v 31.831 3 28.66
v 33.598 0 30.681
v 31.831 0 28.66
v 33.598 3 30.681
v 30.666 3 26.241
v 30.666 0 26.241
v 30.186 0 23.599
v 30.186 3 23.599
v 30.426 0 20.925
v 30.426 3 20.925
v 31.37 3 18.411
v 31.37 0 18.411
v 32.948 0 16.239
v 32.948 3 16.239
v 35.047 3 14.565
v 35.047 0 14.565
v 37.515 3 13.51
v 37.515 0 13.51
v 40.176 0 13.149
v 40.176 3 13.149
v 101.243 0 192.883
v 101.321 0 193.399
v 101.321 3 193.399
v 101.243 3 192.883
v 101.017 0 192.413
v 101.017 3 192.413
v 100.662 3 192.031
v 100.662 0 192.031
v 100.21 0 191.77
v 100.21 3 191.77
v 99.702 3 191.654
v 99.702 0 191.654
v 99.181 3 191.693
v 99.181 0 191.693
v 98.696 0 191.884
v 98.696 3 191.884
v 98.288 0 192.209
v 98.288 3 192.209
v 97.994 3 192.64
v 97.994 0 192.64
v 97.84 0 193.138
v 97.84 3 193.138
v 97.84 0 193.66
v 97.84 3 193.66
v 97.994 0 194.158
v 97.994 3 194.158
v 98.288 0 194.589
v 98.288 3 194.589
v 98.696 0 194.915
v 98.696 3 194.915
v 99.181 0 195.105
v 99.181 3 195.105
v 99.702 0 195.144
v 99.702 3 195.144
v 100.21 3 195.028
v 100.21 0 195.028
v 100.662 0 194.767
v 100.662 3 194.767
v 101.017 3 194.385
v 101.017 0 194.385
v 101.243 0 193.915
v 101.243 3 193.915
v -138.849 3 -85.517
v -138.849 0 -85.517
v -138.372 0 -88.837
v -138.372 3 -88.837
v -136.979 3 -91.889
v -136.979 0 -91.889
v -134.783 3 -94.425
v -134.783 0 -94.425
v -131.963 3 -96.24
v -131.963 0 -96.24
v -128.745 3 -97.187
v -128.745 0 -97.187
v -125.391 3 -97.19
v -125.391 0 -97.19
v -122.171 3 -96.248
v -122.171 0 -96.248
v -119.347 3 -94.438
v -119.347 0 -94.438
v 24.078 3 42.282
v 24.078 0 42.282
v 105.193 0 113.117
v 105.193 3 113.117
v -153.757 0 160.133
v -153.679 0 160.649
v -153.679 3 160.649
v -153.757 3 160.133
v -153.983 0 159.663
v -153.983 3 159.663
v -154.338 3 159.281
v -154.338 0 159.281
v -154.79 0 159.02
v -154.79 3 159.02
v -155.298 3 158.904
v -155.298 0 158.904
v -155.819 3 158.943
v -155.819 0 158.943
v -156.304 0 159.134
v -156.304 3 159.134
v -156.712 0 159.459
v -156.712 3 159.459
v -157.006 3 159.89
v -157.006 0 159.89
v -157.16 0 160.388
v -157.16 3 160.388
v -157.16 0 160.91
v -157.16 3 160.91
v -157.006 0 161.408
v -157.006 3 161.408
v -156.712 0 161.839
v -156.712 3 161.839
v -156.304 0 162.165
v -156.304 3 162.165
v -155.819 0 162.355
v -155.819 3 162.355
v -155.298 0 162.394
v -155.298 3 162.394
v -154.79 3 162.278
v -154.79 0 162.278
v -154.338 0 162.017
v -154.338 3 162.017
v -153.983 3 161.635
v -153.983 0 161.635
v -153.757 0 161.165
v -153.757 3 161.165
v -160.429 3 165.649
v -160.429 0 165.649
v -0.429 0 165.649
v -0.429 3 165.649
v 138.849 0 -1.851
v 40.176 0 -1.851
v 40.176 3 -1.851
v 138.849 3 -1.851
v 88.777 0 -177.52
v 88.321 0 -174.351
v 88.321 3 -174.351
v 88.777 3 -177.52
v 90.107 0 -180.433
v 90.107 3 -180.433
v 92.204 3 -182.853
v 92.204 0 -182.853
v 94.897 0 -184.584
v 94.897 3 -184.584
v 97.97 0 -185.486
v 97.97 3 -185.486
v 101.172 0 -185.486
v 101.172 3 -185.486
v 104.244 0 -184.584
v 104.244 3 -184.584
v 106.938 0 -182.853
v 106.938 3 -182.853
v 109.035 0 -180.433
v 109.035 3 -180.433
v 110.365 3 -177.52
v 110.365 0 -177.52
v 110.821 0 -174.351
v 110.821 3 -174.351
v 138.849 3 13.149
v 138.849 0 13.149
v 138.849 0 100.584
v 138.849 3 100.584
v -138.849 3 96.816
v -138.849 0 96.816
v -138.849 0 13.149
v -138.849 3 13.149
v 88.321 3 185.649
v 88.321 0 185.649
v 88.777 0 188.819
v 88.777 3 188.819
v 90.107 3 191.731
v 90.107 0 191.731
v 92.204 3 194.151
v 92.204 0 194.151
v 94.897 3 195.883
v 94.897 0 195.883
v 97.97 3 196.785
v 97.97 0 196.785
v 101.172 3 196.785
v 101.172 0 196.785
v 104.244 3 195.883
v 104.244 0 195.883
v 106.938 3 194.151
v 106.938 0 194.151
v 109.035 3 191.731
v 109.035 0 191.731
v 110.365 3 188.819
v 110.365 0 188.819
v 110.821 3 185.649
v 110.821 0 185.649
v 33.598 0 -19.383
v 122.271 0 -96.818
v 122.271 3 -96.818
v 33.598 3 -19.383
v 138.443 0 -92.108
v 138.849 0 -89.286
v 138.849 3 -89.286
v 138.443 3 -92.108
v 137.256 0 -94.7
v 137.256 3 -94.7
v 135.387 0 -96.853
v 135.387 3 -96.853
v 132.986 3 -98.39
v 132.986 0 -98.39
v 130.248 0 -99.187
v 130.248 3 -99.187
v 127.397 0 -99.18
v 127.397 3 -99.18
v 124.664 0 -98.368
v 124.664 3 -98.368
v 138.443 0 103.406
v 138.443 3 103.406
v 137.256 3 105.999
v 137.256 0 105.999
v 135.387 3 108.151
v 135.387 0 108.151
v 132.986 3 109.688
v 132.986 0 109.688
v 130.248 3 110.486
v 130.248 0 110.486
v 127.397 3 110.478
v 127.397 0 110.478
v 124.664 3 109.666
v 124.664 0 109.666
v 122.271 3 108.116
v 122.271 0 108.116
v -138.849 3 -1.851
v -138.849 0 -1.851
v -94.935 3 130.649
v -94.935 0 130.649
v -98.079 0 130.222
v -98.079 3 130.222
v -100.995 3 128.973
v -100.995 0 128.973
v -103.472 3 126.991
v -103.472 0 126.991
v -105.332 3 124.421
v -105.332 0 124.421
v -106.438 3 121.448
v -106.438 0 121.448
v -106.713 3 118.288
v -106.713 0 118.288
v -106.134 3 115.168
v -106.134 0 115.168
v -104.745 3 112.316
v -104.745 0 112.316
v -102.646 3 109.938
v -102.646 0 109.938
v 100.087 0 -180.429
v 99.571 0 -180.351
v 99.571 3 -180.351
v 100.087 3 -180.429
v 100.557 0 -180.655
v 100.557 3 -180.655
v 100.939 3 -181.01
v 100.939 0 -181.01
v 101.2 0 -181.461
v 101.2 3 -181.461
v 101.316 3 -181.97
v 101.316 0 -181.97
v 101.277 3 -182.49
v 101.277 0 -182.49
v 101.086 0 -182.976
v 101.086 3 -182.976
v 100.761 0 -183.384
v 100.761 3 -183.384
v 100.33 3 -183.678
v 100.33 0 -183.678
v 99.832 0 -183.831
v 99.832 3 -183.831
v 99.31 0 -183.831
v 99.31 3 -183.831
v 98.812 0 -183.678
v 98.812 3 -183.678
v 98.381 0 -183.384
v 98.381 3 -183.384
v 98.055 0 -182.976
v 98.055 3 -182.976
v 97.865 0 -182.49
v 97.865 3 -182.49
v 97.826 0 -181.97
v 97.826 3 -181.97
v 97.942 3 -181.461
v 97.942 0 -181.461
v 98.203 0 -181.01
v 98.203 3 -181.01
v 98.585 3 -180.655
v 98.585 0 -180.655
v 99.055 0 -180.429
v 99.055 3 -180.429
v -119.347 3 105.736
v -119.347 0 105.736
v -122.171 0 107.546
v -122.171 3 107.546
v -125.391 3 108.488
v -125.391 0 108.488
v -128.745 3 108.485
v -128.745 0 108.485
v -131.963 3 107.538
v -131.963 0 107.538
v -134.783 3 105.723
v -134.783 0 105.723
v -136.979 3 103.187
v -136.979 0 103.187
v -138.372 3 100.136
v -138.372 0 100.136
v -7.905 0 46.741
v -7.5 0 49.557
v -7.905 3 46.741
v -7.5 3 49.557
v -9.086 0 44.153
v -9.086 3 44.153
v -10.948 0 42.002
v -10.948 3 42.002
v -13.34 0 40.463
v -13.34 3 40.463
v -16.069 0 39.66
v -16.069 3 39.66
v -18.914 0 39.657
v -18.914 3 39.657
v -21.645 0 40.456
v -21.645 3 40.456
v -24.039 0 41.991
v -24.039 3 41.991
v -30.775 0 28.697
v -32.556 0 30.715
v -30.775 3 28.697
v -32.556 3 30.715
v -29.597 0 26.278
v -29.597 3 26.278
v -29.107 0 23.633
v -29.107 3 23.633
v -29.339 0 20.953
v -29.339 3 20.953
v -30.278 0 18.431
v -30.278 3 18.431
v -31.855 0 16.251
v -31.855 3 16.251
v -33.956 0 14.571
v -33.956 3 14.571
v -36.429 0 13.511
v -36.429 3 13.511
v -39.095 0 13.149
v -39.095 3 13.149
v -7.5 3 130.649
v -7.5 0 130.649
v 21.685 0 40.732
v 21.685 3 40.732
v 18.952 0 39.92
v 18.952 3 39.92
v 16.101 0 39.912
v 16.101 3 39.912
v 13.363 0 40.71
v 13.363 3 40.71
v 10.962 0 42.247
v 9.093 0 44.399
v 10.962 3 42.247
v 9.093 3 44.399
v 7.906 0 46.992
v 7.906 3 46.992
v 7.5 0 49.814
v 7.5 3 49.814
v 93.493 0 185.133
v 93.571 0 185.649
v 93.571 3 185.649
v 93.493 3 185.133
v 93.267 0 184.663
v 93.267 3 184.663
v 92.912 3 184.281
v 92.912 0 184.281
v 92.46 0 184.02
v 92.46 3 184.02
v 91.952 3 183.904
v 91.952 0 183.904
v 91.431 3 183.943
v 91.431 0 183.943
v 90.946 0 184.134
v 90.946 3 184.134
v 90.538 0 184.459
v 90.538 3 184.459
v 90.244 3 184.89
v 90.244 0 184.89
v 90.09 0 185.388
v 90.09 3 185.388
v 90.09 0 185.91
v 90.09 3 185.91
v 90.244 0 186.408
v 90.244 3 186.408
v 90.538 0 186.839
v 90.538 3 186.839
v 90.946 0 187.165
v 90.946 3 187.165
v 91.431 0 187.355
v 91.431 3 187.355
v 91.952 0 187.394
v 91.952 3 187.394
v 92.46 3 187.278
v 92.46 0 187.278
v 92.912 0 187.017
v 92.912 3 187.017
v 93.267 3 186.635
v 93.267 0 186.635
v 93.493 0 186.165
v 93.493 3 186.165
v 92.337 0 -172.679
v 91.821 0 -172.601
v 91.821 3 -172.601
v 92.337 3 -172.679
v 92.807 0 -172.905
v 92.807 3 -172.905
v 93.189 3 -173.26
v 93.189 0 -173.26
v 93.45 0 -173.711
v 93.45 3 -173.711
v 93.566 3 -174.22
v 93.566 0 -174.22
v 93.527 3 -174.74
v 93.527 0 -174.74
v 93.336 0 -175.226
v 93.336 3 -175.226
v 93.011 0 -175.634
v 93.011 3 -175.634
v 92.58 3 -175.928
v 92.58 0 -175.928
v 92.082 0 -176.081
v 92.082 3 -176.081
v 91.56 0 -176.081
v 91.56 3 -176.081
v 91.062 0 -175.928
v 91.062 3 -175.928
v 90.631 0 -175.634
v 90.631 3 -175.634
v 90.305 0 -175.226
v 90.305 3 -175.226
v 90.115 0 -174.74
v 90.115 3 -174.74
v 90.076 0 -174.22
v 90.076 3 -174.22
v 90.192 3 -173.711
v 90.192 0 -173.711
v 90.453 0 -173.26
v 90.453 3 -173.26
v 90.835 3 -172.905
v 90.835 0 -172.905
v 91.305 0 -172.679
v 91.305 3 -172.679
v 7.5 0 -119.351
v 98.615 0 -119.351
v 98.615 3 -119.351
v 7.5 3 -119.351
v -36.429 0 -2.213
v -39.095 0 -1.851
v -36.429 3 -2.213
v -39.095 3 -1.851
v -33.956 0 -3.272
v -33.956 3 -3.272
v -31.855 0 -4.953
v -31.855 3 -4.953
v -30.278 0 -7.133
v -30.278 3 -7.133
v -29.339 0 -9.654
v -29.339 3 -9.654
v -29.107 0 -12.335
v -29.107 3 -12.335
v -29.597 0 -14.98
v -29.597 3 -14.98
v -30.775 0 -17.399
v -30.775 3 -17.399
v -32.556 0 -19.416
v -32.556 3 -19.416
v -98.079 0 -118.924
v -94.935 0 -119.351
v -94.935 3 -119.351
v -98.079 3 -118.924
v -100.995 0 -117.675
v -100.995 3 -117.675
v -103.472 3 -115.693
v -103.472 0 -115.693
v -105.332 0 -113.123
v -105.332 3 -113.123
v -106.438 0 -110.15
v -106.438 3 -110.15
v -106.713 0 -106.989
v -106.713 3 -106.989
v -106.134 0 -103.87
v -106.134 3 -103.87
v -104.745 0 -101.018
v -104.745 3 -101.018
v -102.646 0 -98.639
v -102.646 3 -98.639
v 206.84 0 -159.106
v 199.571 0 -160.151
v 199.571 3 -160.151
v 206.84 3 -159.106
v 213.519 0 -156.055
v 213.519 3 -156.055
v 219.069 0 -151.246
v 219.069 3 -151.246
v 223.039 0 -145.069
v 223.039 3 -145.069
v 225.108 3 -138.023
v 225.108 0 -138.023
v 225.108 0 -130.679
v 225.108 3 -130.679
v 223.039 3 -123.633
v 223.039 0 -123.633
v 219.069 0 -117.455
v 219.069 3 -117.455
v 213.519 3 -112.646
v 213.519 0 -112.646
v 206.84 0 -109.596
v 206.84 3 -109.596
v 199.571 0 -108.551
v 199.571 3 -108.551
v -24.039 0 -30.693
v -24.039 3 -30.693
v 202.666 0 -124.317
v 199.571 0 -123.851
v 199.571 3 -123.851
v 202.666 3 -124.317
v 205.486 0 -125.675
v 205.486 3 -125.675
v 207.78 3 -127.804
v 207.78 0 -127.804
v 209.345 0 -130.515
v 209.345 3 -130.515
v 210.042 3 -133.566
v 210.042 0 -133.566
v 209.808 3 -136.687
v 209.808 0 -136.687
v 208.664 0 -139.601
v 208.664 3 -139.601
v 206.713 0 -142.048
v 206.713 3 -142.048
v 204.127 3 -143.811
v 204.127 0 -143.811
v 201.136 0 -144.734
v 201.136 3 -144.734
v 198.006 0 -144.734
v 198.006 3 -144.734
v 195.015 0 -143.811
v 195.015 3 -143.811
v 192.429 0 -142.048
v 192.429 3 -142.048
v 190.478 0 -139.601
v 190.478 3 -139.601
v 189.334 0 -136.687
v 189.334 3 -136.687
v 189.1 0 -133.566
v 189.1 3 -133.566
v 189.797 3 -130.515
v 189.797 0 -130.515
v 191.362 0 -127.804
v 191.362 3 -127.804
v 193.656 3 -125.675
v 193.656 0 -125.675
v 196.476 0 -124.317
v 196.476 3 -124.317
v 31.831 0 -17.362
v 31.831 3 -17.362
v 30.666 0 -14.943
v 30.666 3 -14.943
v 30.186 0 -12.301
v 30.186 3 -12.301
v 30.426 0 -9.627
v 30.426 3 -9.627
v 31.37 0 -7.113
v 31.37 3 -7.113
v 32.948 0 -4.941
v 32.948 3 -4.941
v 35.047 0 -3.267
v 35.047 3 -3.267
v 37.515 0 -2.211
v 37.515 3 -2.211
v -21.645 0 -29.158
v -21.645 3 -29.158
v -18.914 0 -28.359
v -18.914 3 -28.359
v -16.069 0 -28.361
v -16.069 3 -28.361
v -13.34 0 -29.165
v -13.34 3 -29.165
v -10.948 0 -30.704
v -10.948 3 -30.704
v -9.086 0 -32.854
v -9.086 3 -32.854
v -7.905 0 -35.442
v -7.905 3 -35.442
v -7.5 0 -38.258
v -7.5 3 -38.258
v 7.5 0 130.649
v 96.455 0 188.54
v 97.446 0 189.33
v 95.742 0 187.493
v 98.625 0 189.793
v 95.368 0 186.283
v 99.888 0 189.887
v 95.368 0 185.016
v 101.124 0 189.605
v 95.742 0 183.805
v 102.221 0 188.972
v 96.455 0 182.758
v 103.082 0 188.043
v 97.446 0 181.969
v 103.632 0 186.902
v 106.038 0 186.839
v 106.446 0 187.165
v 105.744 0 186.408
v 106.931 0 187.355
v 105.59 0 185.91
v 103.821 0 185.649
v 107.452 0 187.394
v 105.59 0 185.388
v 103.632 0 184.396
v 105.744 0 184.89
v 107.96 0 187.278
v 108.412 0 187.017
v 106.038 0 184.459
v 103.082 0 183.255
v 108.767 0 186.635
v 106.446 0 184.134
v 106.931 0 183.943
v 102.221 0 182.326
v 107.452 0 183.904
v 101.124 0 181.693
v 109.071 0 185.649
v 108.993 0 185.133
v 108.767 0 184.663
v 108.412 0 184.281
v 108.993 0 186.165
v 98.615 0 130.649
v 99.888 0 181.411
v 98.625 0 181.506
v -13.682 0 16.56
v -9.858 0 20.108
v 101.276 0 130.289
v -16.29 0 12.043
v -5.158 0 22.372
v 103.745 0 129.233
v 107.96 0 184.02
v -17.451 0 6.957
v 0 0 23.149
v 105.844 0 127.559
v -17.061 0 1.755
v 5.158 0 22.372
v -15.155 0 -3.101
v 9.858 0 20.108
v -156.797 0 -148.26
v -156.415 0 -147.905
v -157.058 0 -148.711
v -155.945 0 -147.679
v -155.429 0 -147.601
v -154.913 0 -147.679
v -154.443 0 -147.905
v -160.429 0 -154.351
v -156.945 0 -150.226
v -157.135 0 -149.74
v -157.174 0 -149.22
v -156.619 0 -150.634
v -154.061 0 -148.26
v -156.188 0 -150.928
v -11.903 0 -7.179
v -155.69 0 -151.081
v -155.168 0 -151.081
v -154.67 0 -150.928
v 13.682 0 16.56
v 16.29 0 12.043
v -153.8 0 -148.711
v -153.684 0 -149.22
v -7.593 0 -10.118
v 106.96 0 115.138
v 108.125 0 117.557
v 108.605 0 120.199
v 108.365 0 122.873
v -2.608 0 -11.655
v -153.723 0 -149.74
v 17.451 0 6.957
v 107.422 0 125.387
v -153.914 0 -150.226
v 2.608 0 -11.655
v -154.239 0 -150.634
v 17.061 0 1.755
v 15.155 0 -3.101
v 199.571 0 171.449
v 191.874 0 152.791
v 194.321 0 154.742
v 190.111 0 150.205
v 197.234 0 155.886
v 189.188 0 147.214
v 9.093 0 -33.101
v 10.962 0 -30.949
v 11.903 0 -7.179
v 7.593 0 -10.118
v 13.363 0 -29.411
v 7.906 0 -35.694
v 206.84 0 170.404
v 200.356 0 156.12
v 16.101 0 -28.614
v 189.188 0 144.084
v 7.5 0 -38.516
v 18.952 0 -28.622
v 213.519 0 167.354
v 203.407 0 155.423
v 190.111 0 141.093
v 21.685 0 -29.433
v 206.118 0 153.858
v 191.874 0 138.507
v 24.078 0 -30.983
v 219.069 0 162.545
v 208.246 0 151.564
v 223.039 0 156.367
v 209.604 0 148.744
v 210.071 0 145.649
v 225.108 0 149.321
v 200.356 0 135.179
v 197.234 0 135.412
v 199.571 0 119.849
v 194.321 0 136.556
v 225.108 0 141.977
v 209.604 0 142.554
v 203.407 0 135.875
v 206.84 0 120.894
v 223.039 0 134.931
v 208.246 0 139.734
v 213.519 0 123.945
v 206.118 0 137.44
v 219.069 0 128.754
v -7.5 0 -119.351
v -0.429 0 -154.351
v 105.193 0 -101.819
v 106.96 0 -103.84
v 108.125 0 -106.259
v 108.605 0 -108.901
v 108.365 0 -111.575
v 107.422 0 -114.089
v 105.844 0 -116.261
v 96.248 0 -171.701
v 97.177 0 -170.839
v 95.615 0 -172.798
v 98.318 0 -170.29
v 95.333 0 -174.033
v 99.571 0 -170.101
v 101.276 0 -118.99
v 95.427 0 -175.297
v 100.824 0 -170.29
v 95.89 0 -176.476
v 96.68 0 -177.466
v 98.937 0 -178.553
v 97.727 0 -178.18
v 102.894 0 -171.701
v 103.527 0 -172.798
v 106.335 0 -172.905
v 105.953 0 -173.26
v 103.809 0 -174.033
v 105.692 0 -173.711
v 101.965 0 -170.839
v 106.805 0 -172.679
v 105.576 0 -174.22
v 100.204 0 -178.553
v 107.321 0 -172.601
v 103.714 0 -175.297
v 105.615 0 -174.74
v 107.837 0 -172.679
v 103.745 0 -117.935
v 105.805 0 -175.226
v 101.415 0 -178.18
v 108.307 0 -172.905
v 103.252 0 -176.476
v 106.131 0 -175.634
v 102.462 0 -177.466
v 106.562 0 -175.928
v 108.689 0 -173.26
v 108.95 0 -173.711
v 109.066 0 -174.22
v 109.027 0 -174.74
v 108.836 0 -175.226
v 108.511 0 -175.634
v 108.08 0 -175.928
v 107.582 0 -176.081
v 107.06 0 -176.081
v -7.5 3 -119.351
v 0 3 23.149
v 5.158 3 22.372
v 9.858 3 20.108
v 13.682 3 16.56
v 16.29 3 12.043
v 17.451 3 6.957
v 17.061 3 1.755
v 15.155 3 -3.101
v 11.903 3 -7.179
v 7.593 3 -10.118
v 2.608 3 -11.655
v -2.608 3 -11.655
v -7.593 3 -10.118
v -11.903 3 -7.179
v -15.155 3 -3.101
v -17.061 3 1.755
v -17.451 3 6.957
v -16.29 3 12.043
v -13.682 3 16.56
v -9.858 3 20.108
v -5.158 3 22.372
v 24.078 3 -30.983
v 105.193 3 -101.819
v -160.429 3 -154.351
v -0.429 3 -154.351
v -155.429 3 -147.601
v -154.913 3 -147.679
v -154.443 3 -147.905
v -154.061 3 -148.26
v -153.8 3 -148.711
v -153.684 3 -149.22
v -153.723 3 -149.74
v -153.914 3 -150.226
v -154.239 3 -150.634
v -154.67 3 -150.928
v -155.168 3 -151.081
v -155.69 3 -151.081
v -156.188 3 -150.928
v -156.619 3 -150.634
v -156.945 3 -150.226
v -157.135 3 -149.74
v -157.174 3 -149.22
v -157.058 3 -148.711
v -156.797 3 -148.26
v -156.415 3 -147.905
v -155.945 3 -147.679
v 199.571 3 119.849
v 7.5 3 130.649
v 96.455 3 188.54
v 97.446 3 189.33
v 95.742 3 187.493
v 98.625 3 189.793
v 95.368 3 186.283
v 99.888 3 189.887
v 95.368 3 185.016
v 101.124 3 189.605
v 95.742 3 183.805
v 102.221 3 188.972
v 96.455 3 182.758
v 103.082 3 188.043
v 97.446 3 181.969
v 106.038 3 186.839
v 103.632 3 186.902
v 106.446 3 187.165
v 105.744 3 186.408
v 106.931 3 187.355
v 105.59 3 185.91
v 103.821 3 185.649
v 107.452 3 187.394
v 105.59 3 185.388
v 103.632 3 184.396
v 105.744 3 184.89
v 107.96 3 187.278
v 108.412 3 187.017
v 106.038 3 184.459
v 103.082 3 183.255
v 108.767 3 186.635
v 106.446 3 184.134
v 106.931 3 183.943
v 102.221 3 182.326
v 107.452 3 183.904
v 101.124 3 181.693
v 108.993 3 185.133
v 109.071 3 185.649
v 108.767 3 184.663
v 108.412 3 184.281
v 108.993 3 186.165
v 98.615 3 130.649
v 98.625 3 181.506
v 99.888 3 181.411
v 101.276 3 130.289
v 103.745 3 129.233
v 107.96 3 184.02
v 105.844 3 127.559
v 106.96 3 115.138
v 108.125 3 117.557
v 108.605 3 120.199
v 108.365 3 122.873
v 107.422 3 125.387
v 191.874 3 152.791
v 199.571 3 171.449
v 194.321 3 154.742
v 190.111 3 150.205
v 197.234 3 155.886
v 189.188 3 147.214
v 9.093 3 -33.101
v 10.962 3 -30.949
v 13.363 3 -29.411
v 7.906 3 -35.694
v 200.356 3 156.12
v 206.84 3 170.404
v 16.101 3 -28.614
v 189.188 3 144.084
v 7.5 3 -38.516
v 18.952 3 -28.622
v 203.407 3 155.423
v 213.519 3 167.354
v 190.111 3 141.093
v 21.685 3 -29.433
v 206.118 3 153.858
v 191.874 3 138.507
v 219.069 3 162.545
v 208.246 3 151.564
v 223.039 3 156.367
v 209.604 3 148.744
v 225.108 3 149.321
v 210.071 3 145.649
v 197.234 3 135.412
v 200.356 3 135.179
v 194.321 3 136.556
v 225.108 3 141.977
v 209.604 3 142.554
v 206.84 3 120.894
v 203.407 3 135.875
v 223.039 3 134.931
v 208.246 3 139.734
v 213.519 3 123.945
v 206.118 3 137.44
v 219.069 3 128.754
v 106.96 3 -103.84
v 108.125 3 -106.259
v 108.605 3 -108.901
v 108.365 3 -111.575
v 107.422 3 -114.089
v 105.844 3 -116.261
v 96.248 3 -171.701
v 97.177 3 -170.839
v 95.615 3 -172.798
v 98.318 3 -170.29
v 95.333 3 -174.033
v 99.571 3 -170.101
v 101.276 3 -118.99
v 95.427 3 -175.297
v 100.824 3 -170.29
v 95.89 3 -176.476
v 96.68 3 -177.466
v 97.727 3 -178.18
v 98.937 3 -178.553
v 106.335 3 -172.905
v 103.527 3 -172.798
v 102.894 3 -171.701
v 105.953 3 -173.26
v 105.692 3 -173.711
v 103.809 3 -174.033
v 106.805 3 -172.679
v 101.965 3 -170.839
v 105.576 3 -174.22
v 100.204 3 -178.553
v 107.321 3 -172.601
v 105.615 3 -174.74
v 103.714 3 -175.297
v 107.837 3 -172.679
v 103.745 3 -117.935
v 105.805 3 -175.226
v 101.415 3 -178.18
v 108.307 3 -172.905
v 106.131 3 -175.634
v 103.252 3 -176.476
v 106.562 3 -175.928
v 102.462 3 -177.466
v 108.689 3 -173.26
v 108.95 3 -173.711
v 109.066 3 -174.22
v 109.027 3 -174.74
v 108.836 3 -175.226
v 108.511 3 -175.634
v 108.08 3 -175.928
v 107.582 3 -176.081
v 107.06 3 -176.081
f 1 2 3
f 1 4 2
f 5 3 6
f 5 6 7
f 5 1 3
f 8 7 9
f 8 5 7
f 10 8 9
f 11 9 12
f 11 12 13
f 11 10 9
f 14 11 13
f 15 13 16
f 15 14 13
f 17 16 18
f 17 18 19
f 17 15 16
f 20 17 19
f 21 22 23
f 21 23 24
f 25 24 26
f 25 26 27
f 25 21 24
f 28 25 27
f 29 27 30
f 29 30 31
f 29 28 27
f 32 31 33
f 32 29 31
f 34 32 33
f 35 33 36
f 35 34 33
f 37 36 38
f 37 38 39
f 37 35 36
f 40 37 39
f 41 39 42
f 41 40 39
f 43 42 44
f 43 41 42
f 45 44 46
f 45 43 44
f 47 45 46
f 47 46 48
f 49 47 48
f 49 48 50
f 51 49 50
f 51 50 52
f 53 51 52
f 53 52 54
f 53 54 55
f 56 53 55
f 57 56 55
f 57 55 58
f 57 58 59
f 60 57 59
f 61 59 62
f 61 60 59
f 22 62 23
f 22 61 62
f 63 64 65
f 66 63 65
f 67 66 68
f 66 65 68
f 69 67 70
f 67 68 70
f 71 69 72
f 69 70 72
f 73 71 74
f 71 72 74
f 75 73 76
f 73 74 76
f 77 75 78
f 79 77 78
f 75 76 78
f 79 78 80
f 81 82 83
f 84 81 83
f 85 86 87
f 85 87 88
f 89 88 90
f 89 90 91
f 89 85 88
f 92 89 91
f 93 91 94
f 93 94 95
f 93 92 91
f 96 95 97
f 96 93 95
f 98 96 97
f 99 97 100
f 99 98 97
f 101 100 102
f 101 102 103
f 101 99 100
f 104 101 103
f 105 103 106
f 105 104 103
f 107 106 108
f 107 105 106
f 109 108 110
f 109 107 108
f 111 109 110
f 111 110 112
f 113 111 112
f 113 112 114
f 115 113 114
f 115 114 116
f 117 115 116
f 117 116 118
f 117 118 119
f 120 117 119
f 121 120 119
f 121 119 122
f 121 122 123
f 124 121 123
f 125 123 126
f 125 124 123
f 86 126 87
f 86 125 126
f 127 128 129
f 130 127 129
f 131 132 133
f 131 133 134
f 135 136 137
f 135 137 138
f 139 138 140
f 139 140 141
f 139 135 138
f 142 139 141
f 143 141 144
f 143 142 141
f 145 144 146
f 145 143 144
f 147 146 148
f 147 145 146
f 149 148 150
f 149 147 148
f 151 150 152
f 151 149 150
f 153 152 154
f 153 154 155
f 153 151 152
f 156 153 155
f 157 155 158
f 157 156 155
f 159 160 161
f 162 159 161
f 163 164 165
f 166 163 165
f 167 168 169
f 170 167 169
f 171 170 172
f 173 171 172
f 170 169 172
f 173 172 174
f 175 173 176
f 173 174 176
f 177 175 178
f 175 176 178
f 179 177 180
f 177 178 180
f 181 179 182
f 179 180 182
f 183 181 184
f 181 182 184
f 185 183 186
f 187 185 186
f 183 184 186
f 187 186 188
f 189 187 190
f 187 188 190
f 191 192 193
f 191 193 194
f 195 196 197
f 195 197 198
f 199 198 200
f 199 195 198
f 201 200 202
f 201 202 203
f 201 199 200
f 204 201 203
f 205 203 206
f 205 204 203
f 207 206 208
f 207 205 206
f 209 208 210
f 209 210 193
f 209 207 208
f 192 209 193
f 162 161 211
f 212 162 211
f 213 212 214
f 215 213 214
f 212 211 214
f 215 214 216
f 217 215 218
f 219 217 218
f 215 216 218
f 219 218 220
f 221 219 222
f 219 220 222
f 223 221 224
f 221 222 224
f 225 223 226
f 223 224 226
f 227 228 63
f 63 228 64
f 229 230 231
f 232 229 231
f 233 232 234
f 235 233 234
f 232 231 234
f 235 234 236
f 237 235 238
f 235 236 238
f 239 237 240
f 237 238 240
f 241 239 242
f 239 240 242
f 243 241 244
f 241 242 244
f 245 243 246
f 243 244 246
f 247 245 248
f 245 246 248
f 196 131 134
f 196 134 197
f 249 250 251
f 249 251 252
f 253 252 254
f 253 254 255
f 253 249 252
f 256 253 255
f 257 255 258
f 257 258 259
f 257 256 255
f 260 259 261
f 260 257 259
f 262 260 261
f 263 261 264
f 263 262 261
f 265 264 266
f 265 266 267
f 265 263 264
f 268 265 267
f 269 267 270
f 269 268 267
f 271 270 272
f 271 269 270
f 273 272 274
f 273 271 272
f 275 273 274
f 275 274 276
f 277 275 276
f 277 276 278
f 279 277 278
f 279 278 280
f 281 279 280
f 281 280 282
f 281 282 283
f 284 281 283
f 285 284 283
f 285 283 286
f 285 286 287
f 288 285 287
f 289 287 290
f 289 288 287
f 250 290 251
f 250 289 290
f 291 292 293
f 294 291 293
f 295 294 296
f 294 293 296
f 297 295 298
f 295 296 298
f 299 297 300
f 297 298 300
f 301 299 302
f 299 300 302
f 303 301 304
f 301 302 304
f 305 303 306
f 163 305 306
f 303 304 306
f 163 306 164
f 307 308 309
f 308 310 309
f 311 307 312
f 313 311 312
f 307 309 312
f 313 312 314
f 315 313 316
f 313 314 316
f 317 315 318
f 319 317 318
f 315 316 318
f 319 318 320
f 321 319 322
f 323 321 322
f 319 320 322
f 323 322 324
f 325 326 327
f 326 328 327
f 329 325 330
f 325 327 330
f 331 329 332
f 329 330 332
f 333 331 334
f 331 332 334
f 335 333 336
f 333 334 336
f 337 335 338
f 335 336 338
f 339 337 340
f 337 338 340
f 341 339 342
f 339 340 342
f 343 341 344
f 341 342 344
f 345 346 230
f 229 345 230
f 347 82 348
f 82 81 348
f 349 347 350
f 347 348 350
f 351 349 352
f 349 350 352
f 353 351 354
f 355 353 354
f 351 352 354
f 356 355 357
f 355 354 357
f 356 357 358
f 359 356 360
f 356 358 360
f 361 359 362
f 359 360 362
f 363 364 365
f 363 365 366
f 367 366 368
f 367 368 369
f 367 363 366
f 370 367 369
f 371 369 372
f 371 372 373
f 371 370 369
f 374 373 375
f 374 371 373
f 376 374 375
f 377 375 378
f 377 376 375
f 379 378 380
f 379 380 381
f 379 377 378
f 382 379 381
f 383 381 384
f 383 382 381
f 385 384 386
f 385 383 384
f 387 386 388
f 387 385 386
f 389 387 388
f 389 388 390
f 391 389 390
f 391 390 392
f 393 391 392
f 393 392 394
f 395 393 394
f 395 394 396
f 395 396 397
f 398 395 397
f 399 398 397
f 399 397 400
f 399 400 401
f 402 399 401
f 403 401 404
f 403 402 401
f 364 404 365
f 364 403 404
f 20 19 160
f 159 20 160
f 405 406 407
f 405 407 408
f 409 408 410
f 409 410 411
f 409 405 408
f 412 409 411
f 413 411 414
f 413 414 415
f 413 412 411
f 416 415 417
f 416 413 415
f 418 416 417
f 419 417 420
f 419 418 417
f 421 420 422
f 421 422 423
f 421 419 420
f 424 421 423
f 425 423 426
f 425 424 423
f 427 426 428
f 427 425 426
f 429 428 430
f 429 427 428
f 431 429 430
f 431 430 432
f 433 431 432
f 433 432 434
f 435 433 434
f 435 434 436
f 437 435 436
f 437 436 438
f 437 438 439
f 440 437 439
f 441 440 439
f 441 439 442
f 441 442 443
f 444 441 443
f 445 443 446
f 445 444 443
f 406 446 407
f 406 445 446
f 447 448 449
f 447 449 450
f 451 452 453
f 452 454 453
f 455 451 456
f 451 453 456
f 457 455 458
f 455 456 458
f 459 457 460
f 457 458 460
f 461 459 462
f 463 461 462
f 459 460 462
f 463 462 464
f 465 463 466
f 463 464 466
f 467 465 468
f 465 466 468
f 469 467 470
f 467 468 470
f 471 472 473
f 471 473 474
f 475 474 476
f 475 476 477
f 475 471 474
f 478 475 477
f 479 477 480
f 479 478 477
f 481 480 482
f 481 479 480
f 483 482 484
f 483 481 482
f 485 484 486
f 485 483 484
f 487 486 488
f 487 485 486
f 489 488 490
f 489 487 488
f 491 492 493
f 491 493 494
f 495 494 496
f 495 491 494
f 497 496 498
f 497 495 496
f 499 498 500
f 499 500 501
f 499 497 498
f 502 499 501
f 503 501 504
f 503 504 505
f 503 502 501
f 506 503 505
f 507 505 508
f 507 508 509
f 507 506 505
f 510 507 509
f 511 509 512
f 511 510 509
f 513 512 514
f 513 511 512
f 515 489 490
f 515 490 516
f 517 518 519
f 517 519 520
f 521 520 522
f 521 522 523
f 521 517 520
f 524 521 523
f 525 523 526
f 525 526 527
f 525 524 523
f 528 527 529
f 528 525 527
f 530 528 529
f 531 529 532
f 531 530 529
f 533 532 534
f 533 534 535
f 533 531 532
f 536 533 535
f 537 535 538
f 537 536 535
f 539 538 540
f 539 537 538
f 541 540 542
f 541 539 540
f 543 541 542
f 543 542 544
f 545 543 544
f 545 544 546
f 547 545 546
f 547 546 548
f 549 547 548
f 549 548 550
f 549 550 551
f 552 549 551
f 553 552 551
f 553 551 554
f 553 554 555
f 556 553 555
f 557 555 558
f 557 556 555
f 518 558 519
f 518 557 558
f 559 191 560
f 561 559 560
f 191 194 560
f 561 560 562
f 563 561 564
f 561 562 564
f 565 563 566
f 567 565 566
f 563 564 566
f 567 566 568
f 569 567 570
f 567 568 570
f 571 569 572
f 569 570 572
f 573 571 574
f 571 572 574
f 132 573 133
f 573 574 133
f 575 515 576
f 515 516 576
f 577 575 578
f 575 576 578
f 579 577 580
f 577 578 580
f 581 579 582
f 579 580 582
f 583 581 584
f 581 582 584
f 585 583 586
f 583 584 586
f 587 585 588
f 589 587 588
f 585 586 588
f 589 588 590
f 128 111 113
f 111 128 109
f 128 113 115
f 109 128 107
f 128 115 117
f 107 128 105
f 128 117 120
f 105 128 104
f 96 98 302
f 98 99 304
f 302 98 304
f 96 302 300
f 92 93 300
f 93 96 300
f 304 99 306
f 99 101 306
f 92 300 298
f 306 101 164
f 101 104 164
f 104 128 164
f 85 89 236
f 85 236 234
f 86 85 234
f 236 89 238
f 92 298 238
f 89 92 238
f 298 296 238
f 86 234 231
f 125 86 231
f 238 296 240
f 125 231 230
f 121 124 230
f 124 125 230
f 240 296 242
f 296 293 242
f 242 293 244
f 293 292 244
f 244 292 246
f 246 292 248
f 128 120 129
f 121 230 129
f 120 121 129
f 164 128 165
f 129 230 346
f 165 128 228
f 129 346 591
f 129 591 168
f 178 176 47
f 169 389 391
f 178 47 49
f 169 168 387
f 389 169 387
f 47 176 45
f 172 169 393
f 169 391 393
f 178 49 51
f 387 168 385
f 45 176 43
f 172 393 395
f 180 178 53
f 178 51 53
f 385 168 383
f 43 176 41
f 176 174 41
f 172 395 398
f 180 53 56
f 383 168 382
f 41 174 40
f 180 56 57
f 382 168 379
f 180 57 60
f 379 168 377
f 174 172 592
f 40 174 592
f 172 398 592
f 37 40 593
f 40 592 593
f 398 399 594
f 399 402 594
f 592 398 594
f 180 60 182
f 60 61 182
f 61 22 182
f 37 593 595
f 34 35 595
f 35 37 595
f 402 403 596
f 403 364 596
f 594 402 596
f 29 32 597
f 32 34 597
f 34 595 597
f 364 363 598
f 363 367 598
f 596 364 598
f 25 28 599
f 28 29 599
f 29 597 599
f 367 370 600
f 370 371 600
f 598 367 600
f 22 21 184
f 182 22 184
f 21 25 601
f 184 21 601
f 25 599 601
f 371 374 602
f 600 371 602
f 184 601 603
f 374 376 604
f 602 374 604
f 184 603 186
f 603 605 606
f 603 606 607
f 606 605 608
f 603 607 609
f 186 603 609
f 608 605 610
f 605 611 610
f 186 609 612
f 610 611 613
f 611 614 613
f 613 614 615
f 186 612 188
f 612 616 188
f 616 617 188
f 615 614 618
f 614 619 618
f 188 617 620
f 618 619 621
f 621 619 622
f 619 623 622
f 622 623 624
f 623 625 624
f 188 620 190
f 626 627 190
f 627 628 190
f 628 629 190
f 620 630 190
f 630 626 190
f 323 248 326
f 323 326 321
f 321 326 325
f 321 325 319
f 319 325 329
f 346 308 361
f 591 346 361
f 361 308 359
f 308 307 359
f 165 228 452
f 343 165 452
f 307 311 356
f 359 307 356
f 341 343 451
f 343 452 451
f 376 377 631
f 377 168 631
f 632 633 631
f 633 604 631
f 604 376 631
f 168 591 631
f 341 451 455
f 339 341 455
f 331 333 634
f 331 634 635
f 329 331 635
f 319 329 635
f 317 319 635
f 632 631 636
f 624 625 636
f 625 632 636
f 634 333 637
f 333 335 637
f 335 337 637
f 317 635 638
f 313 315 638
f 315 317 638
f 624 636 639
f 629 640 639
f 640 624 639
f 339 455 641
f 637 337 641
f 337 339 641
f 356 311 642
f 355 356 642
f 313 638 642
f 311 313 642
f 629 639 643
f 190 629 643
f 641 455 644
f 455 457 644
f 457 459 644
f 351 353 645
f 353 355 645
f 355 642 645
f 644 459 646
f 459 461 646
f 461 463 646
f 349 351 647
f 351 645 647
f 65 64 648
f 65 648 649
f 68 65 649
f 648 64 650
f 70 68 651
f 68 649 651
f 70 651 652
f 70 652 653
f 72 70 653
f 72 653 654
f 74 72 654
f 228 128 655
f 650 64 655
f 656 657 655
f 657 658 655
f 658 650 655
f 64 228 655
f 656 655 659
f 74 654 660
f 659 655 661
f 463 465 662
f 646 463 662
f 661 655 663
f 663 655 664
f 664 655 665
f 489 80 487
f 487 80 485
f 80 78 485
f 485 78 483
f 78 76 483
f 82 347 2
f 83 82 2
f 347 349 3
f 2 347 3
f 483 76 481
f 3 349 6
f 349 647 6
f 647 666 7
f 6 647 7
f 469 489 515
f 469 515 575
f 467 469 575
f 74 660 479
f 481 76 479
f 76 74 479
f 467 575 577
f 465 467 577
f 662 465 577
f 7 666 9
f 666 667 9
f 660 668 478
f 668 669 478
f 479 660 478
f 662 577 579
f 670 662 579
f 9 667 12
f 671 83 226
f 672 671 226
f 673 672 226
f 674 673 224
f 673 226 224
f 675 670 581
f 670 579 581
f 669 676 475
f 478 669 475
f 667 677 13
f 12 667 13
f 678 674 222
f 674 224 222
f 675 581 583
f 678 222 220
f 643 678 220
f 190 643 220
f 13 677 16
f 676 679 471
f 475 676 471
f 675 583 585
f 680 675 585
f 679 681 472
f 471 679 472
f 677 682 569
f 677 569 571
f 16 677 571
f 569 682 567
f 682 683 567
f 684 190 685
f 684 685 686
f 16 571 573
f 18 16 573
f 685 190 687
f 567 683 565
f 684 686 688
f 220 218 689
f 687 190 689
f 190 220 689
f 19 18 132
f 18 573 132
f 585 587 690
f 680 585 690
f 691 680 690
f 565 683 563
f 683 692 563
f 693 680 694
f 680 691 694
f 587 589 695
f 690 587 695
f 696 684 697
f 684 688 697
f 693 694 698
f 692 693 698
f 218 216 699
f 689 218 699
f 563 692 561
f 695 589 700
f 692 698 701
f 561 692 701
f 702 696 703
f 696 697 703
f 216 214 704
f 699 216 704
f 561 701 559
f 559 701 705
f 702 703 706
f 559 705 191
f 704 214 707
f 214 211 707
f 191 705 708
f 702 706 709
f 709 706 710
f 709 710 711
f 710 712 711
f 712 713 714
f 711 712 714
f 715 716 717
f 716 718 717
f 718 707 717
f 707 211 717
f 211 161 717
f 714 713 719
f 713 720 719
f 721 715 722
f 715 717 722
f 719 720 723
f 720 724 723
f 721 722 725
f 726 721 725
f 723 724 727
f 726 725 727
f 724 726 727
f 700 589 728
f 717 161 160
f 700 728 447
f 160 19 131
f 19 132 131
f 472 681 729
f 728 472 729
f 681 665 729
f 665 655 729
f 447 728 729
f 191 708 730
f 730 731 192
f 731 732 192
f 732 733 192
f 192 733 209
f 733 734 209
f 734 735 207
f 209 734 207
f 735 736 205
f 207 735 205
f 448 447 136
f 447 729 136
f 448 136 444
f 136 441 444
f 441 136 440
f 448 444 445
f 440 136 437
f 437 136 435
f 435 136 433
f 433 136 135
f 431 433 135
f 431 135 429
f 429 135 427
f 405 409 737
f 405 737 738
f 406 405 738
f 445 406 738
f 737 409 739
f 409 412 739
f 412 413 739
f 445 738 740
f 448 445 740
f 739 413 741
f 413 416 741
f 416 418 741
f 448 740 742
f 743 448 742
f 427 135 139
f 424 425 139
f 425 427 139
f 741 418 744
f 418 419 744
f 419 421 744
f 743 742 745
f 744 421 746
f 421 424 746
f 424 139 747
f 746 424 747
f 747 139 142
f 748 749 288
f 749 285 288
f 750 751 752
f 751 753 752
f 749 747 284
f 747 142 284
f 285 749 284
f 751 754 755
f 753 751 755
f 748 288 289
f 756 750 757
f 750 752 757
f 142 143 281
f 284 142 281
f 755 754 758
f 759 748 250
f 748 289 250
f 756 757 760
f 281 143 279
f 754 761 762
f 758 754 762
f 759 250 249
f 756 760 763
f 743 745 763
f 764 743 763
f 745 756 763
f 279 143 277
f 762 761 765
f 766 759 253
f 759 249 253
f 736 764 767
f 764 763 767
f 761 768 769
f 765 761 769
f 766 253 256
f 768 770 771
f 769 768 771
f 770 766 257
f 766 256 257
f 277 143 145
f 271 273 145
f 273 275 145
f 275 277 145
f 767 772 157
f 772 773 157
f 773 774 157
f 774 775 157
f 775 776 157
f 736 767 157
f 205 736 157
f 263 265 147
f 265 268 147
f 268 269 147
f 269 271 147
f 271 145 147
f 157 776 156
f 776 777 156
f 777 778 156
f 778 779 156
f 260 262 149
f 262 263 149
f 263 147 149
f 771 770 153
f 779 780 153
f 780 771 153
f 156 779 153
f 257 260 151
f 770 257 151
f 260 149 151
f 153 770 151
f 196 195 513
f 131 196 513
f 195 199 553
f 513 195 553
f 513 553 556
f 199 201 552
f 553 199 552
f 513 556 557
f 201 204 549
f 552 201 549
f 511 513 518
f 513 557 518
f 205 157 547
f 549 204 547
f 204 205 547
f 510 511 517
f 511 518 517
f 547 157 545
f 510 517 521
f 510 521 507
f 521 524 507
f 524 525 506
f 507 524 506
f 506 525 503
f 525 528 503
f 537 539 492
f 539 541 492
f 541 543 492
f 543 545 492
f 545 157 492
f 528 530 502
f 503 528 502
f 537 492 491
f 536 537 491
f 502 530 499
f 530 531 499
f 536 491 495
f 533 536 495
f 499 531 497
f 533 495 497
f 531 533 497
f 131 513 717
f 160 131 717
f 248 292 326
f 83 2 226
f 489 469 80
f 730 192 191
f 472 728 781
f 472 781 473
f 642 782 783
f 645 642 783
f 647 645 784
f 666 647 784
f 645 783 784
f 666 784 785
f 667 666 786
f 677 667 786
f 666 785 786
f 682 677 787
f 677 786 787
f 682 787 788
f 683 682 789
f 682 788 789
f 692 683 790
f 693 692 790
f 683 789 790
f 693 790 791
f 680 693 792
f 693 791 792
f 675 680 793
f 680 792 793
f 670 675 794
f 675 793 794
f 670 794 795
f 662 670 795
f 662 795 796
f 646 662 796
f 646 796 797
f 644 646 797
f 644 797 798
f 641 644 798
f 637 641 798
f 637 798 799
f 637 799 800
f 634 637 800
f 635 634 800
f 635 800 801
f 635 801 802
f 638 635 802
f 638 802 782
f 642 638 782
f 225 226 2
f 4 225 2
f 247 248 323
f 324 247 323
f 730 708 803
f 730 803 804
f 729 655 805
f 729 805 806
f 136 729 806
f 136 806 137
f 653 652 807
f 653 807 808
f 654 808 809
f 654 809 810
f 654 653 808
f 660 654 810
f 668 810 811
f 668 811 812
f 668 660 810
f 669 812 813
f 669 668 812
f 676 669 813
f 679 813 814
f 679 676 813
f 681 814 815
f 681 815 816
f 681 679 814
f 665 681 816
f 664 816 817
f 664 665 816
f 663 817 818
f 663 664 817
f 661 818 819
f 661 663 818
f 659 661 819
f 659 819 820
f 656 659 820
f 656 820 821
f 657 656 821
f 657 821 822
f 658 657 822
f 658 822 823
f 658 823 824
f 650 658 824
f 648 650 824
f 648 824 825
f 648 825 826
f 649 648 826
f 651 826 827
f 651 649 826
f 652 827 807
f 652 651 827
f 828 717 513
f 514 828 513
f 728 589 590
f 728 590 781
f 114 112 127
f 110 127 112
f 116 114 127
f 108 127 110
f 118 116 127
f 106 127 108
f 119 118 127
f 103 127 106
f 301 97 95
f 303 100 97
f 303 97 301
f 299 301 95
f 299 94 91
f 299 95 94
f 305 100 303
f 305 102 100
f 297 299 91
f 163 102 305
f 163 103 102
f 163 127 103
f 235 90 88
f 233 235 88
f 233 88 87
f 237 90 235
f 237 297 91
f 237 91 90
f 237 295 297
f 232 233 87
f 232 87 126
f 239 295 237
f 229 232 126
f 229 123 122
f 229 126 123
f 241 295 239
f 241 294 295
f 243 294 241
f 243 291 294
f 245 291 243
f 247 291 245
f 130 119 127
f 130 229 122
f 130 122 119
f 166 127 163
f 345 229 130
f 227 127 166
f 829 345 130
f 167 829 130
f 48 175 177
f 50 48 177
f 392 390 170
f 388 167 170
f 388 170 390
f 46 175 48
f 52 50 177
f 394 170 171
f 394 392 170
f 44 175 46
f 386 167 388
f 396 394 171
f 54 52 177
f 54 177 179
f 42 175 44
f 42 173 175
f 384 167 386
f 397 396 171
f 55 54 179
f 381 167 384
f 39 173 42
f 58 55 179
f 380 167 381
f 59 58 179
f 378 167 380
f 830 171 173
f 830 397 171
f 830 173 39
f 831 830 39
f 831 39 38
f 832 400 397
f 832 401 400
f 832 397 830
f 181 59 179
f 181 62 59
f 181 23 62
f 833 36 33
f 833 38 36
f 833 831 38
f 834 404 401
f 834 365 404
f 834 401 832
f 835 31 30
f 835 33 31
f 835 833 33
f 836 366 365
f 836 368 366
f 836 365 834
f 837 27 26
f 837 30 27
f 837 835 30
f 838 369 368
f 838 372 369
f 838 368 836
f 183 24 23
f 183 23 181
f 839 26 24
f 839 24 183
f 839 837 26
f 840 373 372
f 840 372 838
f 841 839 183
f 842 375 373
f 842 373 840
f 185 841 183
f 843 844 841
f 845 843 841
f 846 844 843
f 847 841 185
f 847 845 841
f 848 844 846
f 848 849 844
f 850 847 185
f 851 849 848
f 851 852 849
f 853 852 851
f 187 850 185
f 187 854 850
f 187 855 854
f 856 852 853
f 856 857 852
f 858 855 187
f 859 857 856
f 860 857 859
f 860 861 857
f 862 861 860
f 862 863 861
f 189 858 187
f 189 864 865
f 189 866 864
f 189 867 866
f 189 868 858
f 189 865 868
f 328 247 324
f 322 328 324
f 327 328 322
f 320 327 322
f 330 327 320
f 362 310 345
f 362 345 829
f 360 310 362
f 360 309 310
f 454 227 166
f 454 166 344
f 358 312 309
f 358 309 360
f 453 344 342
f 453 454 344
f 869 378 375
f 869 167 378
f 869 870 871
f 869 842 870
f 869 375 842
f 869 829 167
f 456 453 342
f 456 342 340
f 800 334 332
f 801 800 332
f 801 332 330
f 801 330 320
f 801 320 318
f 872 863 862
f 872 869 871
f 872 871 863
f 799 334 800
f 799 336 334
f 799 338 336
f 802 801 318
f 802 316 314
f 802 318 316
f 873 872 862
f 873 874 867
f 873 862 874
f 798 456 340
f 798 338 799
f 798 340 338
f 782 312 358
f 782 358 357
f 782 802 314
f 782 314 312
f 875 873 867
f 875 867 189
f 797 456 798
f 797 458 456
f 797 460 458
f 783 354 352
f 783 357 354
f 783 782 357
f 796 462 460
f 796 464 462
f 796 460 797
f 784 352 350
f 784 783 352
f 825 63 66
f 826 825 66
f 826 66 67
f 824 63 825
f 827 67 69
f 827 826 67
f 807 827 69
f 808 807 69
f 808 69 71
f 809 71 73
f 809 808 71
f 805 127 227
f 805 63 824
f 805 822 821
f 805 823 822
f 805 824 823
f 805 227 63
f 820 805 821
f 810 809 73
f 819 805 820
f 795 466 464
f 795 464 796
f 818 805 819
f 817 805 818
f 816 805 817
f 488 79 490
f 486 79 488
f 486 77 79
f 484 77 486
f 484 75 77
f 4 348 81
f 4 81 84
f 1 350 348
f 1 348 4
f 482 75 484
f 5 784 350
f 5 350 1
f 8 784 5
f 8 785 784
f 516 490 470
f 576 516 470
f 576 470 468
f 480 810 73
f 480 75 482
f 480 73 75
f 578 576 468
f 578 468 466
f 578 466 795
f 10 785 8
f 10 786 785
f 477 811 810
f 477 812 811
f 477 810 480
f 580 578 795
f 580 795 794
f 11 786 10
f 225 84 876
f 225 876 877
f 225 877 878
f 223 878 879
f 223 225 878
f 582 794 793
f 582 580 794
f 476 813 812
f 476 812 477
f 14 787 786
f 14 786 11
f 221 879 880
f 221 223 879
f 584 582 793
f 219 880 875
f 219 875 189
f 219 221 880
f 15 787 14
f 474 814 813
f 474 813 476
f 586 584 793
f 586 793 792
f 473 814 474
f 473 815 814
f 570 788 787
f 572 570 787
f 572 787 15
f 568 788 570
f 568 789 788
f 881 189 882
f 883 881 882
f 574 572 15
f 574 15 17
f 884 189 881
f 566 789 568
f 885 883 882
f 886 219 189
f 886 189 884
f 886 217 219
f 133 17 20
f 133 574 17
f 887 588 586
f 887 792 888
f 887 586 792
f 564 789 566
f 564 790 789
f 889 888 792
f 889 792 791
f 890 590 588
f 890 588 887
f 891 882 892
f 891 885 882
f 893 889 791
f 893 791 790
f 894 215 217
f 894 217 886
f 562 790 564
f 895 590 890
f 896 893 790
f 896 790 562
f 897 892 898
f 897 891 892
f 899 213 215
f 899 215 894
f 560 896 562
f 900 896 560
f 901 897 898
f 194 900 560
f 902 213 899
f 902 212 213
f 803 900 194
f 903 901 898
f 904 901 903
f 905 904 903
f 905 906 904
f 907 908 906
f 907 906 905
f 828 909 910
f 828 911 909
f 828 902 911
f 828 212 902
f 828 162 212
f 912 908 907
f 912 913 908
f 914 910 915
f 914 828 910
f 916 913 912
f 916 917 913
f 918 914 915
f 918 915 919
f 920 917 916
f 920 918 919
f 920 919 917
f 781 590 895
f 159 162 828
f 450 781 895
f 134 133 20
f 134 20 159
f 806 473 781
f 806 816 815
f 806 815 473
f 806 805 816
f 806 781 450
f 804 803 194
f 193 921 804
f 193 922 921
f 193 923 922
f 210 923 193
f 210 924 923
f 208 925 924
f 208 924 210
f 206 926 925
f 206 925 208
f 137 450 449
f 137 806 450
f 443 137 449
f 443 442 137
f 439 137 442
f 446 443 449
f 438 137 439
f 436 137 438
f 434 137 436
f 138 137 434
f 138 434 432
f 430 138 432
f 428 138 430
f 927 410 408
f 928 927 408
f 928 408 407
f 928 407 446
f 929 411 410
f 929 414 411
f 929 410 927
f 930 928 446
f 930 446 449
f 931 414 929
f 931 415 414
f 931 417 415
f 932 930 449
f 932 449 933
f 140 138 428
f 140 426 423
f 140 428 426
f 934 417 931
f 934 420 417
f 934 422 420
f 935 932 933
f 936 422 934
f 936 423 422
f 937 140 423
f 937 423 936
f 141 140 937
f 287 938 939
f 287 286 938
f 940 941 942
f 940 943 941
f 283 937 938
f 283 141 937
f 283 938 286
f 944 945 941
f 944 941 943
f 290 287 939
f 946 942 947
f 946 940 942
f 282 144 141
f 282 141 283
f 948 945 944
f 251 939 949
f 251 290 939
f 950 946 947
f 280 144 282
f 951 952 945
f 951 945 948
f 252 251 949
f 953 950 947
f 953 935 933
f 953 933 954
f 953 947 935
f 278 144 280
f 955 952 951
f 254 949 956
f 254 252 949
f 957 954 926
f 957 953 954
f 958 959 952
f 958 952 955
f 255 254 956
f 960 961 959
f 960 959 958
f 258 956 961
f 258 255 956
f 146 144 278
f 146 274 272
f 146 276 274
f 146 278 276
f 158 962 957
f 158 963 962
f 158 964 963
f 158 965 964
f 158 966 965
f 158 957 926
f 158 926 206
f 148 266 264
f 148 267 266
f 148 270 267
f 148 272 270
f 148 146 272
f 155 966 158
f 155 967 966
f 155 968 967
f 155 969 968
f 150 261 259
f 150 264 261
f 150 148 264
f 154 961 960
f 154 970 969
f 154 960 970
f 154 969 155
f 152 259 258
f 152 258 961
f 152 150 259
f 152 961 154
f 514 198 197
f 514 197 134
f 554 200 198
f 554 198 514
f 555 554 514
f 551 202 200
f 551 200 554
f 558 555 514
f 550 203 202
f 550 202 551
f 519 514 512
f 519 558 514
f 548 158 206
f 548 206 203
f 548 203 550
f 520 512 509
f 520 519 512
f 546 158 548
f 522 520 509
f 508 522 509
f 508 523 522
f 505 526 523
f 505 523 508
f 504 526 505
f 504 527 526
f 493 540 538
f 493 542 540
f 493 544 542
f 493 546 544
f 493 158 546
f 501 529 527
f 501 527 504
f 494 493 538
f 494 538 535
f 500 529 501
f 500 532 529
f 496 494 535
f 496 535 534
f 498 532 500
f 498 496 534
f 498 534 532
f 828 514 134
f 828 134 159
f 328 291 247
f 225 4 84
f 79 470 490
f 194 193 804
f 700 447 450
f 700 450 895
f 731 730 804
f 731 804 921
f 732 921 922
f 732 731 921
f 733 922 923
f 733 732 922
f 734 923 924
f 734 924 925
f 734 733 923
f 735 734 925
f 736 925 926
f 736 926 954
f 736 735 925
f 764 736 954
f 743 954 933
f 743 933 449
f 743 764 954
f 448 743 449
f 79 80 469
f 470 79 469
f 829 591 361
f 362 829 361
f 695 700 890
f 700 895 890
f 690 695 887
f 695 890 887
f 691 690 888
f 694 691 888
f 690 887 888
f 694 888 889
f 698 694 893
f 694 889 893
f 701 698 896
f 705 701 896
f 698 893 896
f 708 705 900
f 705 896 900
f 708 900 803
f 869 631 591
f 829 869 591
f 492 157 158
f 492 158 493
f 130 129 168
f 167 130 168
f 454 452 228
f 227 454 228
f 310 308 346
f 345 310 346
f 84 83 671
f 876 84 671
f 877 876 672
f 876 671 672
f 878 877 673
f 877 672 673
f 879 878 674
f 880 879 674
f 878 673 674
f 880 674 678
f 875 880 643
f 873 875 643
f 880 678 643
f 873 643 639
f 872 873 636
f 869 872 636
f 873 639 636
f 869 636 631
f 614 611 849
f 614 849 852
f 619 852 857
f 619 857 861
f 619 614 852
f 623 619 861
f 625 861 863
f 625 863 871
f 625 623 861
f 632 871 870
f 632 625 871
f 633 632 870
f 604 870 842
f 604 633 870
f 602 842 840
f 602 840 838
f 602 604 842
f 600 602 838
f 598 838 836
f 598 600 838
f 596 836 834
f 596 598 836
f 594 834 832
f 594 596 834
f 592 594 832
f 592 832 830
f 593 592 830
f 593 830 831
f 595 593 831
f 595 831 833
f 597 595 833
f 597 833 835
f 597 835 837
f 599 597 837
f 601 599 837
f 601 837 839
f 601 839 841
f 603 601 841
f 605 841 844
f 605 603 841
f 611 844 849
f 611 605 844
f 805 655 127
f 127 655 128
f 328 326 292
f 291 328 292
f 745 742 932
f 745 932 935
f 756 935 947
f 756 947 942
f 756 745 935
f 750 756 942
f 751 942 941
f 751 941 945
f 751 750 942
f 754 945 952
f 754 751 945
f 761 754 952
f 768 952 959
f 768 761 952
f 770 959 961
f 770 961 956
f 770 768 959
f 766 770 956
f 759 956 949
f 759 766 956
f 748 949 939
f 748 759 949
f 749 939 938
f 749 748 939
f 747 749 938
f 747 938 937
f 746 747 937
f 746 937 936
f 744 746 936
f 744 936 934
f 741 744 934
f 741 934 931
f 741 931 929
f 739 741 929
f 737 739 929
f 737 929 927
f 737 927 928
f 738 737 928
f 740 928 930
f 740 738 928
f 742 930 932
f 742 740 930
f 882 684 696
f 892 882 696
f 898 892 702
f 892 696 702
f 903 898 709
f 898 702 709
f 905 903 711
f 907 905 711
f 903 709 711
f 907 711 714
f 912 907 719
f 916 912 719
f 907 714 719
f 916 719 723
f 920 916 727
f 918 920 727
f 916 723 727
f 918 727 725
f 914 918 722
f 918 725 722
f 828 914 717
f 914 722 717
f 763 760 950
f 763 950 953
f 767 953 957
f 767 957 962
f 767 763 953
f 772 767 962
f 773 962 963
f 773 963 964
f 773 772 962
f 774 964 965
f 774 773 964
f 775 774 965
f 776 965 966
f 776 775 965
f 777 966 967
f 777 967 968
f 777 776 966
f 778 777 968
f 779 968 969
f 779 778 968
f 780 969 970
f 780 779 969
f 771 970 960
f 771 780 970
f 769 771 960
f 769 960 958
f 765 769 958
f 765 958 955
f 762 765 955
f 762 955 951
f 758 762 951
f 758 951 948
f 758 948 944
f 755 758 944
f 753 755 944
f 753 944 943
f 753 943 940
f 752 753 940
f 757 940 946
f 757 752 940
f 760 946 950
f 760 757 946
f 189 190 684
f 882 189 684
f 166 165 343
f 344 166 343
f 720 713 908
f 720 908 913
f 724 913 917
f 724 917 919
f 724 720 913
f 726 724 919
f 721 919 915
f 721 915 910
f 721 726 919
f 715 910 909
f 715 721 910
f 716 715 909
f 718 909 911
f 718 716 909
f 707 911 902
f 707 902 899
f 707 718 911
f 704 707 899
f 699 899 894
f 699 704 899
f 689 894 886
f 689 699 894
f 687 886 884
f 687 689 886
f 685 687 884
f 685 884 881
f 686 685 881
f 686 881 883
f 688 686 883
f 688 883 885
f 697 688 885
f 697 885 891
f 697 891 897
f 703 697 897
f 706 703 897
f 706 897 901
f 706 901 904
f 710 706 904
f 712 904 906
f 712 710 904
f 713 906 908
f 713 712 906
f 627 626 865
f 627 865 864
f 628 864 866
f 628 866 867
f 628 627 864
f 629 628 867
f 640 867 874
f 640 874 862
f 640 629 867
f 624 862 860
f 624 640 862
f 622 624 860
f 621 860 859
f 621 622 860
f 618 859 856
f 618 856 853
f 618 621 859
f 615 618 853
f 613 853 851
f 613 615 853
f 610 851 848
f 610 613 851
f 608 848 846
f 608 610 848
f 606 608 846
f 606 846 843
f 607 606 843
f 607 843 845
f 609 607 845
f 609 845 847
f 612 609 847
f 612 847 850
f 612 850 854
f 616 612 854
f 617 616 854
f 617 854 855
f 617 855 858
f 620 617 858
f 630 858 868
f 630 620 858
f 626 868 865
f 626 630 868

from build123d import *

# Parameters (mm, degrees)
SKETCH1_R             = 1.75
BOSS_EXTRUDE2_DEPTH   = 3
SKETCH1_R_2           = 4.25
SKETCH1_R_3           = 10.5
BOSS_EXTRUDE2_2_DEPTH = 3
FILLET1_R             = 10
SKETCH2_R             = 17.5
CUT_EXTRUDE1_DEPTH    = 10


with BuildPart() as part:
    # Sketch1 → Boss-Extrude2 (new body)
    with BuildSketch(Plane(origin=(0, 0, 0), x_dir=(1, 0, 0), z_dir=(0, 1, 0))):
        with Locations((153.848996294, -160.649182064)):
            Circle(SKETCH1_R)
    boss_extrude2 = extrude(amount=BOSS_EXTRUDE2_DEPTH)


with BuildPart() as body_2:
    # Sketch1 → Boss-Extrude2 2 (new body)
    with BuildSketch(Plane(origin=(0, 0, 0), x_dir=(1, 0, 0), z_dir=(0, 1, 0))):
        with BuildLine():
            Line((-160.429103157, 154.350817936), (-0.429103157, 154.350817936))
            Line((-0.429103157, 154.350817936), (88.320896843, 174.350817936))
            ThreePointArc((88.320896843, 174.350817936), (99.570896843, 185.600817936), (110.820896843, 174.350817936))
            Line((110.820896843, 174.350817936), (199.570896843, 160.150817936))
            ThreePointArc((199.570896843, 160.150817936), (225.370896843, 134.350817936), (199.570896843, 108.550817936))
            Line((199.570896843, 108.550817936), (199.570896843, -5.649182064))
            Line((199.570896843, -5.649182064), (140.384809243, -5.649182064))
            Line((140.384809243, -5.649182064), (17.871310963, -5.649182064))
            Line((17.871310963, -5.649182064), (-17.871310963, -5.649182064))
            Line((-17.871310963, -5.649182064), (-140.384809243, -5.649182064))
            Line((-140.384809243, -5.649182064), (-160.429103157, -5.649182064))
            Line((-160.429103157, -5.649182064), (-160.429103157, 154.350817936))
        make_face()
        with Locations((99.570896843, 174.350817936)):
            Circle(SKETCH1_R_2, mode=Mode.SUBTRACT)
        with Locations((199.570896843, 134.350817936)):
            Circle(SKETCH1_R_3, mode=Mode.SUBTRACT)
        with Locations((-155.429103157, 149.350817936)):
            Circle(SKETCH1_R, mode=Mode.SUBTRACT)
        with Locations((153.848996294, 149.350817936)):
            Circle(SKETCH1_R, mode=Mode.SUBTRACT)
        with Locations((107.320896843, 174.350817936)):
            Circle(SKETCH1_R, mode=Mode.SUBTRACT)
        with Locations((91.820896843, 174.350817936)):
            Circle(SKETCH1_R, mode=Mode.SUBTRACT)
        with Locations((99.570896843, 182.100817936)):
            Circle(SKETCH1_R, mode=Mode.SUBTRACT)
        with BuildLine():
            Line((98.615479423, 119.350817936), (7.5, 119.350817936))
            Line((7.5, 119.350817936), (7.5, 16.506675056))
            Line((7.5, 16.506675056), (105.19311723, 101.818575184))
            ThreePointArc((105.19311723, 101.818575184), (107.978236162, 112.863478785), (98.615479423, 119.350817936))
        make_face(mode=Mode.SUBTRACT)
        with BuildLine():
            Line((-102.646063409, 98.639396028), (-7.5, 16.39642362))
            Line((-7.5, 16.39642362), (-7.5, 119.350817936))
            Line((-7.5, 119.350817936), (-94.935387285, 119.350817936))
            ThreePointArc((-94.935387285, 119.350817936), (-105.985472395, 111.673646608), (-102.646063409, 98.639396028))
        make_face(mode=Mode.SUBTRACT)
        with BuildLine():
            Line((122.271358487, 96.81800419), (13.521694655, 1.850817936))
            Line((13.521694655, 1.850817936), (138.848996294, 1.850817936))
            Line((138.848996294, 1.850817936), (138.848996294, 89.285761438))
            ThreePointArc((138.848996294, 89.285761438), (132.985638769, 98.390056525), (122.271358487, 96.81800419))
        make_face(mode=Mode.SUBTRACT)
        with BuildLine():
            Line((-119.347301526, 94.437659895), (-12.234519996, 1.850817936))
            Line((-12.234519996, 1.850817936), (-138.848996294, 1.850817936))
            Line((-138.848996294, 1.850817936), (-138.848996294, 85.517256632))
            ThreePointArc((-138.848996294, 85.517256632), (-131.96263843, 96.23977608), (-119.347301526, 94.437659895))
        make_face(mode=Mode.SUBTRACT)
    boss_extrude2_2 = extrude(amount=BOSS_EXTRUDE2_2_DEPTH)


with BuildPart() as part_1:
    add(part.part)

    add(body_2.part)  # Mirror1 merges body 2
    # Mirror1: Boss-Extrude2, Boss-Extrude2 2 across plane
    add(boss_extrude2.mirror(Plane(origin=(199.570896843, 3, 5.649182064), x_dir=(1, 0, 0), z_dir=(0, 0, -1))))
    add(boss_extrude2_2.mirror(Plane(origin=(199.570896843, 3, 5.649182064), x_dir=(1, 0, 0), z_dir=(0, 0, -1))))

    # Fillet1
    fillet1_edges = [part_1.edges().sort_by_distance(p)[0] for p in [
        (-12.234519996, 1.5, 13.149182064),
        (-12.234519996, 1.5, -1.850817936),
        (-7.5, 1.5, -16.39642362),
        (7.5, 1.5, -16.506675056),
        (13.521694655, 1.5, -1.850817936),
        (13.521694655, 1.5, 13.149182064),
        (7.5, 1.5, 27.805039185),
        (-7.5, 1.5, 27.694787748),
    ]]
    fillet(fillet1_edges, radius=FILLET1_R)

    # Sketch2 → Cut-Extrude1 (cut)
    with BuildSketch(Plane(origin=(0, 3, 0), x_dir=(1, 0, 0), z_dir=(0, 1, 0))):
        with Locations((0, -5.649182064)):
            Circle(SKETCH2_R)
    extrude(amount=-CUT_EXTRUDE1_DEPTH, mode=Mode.SUBTRACT)


solid = part_1.part
